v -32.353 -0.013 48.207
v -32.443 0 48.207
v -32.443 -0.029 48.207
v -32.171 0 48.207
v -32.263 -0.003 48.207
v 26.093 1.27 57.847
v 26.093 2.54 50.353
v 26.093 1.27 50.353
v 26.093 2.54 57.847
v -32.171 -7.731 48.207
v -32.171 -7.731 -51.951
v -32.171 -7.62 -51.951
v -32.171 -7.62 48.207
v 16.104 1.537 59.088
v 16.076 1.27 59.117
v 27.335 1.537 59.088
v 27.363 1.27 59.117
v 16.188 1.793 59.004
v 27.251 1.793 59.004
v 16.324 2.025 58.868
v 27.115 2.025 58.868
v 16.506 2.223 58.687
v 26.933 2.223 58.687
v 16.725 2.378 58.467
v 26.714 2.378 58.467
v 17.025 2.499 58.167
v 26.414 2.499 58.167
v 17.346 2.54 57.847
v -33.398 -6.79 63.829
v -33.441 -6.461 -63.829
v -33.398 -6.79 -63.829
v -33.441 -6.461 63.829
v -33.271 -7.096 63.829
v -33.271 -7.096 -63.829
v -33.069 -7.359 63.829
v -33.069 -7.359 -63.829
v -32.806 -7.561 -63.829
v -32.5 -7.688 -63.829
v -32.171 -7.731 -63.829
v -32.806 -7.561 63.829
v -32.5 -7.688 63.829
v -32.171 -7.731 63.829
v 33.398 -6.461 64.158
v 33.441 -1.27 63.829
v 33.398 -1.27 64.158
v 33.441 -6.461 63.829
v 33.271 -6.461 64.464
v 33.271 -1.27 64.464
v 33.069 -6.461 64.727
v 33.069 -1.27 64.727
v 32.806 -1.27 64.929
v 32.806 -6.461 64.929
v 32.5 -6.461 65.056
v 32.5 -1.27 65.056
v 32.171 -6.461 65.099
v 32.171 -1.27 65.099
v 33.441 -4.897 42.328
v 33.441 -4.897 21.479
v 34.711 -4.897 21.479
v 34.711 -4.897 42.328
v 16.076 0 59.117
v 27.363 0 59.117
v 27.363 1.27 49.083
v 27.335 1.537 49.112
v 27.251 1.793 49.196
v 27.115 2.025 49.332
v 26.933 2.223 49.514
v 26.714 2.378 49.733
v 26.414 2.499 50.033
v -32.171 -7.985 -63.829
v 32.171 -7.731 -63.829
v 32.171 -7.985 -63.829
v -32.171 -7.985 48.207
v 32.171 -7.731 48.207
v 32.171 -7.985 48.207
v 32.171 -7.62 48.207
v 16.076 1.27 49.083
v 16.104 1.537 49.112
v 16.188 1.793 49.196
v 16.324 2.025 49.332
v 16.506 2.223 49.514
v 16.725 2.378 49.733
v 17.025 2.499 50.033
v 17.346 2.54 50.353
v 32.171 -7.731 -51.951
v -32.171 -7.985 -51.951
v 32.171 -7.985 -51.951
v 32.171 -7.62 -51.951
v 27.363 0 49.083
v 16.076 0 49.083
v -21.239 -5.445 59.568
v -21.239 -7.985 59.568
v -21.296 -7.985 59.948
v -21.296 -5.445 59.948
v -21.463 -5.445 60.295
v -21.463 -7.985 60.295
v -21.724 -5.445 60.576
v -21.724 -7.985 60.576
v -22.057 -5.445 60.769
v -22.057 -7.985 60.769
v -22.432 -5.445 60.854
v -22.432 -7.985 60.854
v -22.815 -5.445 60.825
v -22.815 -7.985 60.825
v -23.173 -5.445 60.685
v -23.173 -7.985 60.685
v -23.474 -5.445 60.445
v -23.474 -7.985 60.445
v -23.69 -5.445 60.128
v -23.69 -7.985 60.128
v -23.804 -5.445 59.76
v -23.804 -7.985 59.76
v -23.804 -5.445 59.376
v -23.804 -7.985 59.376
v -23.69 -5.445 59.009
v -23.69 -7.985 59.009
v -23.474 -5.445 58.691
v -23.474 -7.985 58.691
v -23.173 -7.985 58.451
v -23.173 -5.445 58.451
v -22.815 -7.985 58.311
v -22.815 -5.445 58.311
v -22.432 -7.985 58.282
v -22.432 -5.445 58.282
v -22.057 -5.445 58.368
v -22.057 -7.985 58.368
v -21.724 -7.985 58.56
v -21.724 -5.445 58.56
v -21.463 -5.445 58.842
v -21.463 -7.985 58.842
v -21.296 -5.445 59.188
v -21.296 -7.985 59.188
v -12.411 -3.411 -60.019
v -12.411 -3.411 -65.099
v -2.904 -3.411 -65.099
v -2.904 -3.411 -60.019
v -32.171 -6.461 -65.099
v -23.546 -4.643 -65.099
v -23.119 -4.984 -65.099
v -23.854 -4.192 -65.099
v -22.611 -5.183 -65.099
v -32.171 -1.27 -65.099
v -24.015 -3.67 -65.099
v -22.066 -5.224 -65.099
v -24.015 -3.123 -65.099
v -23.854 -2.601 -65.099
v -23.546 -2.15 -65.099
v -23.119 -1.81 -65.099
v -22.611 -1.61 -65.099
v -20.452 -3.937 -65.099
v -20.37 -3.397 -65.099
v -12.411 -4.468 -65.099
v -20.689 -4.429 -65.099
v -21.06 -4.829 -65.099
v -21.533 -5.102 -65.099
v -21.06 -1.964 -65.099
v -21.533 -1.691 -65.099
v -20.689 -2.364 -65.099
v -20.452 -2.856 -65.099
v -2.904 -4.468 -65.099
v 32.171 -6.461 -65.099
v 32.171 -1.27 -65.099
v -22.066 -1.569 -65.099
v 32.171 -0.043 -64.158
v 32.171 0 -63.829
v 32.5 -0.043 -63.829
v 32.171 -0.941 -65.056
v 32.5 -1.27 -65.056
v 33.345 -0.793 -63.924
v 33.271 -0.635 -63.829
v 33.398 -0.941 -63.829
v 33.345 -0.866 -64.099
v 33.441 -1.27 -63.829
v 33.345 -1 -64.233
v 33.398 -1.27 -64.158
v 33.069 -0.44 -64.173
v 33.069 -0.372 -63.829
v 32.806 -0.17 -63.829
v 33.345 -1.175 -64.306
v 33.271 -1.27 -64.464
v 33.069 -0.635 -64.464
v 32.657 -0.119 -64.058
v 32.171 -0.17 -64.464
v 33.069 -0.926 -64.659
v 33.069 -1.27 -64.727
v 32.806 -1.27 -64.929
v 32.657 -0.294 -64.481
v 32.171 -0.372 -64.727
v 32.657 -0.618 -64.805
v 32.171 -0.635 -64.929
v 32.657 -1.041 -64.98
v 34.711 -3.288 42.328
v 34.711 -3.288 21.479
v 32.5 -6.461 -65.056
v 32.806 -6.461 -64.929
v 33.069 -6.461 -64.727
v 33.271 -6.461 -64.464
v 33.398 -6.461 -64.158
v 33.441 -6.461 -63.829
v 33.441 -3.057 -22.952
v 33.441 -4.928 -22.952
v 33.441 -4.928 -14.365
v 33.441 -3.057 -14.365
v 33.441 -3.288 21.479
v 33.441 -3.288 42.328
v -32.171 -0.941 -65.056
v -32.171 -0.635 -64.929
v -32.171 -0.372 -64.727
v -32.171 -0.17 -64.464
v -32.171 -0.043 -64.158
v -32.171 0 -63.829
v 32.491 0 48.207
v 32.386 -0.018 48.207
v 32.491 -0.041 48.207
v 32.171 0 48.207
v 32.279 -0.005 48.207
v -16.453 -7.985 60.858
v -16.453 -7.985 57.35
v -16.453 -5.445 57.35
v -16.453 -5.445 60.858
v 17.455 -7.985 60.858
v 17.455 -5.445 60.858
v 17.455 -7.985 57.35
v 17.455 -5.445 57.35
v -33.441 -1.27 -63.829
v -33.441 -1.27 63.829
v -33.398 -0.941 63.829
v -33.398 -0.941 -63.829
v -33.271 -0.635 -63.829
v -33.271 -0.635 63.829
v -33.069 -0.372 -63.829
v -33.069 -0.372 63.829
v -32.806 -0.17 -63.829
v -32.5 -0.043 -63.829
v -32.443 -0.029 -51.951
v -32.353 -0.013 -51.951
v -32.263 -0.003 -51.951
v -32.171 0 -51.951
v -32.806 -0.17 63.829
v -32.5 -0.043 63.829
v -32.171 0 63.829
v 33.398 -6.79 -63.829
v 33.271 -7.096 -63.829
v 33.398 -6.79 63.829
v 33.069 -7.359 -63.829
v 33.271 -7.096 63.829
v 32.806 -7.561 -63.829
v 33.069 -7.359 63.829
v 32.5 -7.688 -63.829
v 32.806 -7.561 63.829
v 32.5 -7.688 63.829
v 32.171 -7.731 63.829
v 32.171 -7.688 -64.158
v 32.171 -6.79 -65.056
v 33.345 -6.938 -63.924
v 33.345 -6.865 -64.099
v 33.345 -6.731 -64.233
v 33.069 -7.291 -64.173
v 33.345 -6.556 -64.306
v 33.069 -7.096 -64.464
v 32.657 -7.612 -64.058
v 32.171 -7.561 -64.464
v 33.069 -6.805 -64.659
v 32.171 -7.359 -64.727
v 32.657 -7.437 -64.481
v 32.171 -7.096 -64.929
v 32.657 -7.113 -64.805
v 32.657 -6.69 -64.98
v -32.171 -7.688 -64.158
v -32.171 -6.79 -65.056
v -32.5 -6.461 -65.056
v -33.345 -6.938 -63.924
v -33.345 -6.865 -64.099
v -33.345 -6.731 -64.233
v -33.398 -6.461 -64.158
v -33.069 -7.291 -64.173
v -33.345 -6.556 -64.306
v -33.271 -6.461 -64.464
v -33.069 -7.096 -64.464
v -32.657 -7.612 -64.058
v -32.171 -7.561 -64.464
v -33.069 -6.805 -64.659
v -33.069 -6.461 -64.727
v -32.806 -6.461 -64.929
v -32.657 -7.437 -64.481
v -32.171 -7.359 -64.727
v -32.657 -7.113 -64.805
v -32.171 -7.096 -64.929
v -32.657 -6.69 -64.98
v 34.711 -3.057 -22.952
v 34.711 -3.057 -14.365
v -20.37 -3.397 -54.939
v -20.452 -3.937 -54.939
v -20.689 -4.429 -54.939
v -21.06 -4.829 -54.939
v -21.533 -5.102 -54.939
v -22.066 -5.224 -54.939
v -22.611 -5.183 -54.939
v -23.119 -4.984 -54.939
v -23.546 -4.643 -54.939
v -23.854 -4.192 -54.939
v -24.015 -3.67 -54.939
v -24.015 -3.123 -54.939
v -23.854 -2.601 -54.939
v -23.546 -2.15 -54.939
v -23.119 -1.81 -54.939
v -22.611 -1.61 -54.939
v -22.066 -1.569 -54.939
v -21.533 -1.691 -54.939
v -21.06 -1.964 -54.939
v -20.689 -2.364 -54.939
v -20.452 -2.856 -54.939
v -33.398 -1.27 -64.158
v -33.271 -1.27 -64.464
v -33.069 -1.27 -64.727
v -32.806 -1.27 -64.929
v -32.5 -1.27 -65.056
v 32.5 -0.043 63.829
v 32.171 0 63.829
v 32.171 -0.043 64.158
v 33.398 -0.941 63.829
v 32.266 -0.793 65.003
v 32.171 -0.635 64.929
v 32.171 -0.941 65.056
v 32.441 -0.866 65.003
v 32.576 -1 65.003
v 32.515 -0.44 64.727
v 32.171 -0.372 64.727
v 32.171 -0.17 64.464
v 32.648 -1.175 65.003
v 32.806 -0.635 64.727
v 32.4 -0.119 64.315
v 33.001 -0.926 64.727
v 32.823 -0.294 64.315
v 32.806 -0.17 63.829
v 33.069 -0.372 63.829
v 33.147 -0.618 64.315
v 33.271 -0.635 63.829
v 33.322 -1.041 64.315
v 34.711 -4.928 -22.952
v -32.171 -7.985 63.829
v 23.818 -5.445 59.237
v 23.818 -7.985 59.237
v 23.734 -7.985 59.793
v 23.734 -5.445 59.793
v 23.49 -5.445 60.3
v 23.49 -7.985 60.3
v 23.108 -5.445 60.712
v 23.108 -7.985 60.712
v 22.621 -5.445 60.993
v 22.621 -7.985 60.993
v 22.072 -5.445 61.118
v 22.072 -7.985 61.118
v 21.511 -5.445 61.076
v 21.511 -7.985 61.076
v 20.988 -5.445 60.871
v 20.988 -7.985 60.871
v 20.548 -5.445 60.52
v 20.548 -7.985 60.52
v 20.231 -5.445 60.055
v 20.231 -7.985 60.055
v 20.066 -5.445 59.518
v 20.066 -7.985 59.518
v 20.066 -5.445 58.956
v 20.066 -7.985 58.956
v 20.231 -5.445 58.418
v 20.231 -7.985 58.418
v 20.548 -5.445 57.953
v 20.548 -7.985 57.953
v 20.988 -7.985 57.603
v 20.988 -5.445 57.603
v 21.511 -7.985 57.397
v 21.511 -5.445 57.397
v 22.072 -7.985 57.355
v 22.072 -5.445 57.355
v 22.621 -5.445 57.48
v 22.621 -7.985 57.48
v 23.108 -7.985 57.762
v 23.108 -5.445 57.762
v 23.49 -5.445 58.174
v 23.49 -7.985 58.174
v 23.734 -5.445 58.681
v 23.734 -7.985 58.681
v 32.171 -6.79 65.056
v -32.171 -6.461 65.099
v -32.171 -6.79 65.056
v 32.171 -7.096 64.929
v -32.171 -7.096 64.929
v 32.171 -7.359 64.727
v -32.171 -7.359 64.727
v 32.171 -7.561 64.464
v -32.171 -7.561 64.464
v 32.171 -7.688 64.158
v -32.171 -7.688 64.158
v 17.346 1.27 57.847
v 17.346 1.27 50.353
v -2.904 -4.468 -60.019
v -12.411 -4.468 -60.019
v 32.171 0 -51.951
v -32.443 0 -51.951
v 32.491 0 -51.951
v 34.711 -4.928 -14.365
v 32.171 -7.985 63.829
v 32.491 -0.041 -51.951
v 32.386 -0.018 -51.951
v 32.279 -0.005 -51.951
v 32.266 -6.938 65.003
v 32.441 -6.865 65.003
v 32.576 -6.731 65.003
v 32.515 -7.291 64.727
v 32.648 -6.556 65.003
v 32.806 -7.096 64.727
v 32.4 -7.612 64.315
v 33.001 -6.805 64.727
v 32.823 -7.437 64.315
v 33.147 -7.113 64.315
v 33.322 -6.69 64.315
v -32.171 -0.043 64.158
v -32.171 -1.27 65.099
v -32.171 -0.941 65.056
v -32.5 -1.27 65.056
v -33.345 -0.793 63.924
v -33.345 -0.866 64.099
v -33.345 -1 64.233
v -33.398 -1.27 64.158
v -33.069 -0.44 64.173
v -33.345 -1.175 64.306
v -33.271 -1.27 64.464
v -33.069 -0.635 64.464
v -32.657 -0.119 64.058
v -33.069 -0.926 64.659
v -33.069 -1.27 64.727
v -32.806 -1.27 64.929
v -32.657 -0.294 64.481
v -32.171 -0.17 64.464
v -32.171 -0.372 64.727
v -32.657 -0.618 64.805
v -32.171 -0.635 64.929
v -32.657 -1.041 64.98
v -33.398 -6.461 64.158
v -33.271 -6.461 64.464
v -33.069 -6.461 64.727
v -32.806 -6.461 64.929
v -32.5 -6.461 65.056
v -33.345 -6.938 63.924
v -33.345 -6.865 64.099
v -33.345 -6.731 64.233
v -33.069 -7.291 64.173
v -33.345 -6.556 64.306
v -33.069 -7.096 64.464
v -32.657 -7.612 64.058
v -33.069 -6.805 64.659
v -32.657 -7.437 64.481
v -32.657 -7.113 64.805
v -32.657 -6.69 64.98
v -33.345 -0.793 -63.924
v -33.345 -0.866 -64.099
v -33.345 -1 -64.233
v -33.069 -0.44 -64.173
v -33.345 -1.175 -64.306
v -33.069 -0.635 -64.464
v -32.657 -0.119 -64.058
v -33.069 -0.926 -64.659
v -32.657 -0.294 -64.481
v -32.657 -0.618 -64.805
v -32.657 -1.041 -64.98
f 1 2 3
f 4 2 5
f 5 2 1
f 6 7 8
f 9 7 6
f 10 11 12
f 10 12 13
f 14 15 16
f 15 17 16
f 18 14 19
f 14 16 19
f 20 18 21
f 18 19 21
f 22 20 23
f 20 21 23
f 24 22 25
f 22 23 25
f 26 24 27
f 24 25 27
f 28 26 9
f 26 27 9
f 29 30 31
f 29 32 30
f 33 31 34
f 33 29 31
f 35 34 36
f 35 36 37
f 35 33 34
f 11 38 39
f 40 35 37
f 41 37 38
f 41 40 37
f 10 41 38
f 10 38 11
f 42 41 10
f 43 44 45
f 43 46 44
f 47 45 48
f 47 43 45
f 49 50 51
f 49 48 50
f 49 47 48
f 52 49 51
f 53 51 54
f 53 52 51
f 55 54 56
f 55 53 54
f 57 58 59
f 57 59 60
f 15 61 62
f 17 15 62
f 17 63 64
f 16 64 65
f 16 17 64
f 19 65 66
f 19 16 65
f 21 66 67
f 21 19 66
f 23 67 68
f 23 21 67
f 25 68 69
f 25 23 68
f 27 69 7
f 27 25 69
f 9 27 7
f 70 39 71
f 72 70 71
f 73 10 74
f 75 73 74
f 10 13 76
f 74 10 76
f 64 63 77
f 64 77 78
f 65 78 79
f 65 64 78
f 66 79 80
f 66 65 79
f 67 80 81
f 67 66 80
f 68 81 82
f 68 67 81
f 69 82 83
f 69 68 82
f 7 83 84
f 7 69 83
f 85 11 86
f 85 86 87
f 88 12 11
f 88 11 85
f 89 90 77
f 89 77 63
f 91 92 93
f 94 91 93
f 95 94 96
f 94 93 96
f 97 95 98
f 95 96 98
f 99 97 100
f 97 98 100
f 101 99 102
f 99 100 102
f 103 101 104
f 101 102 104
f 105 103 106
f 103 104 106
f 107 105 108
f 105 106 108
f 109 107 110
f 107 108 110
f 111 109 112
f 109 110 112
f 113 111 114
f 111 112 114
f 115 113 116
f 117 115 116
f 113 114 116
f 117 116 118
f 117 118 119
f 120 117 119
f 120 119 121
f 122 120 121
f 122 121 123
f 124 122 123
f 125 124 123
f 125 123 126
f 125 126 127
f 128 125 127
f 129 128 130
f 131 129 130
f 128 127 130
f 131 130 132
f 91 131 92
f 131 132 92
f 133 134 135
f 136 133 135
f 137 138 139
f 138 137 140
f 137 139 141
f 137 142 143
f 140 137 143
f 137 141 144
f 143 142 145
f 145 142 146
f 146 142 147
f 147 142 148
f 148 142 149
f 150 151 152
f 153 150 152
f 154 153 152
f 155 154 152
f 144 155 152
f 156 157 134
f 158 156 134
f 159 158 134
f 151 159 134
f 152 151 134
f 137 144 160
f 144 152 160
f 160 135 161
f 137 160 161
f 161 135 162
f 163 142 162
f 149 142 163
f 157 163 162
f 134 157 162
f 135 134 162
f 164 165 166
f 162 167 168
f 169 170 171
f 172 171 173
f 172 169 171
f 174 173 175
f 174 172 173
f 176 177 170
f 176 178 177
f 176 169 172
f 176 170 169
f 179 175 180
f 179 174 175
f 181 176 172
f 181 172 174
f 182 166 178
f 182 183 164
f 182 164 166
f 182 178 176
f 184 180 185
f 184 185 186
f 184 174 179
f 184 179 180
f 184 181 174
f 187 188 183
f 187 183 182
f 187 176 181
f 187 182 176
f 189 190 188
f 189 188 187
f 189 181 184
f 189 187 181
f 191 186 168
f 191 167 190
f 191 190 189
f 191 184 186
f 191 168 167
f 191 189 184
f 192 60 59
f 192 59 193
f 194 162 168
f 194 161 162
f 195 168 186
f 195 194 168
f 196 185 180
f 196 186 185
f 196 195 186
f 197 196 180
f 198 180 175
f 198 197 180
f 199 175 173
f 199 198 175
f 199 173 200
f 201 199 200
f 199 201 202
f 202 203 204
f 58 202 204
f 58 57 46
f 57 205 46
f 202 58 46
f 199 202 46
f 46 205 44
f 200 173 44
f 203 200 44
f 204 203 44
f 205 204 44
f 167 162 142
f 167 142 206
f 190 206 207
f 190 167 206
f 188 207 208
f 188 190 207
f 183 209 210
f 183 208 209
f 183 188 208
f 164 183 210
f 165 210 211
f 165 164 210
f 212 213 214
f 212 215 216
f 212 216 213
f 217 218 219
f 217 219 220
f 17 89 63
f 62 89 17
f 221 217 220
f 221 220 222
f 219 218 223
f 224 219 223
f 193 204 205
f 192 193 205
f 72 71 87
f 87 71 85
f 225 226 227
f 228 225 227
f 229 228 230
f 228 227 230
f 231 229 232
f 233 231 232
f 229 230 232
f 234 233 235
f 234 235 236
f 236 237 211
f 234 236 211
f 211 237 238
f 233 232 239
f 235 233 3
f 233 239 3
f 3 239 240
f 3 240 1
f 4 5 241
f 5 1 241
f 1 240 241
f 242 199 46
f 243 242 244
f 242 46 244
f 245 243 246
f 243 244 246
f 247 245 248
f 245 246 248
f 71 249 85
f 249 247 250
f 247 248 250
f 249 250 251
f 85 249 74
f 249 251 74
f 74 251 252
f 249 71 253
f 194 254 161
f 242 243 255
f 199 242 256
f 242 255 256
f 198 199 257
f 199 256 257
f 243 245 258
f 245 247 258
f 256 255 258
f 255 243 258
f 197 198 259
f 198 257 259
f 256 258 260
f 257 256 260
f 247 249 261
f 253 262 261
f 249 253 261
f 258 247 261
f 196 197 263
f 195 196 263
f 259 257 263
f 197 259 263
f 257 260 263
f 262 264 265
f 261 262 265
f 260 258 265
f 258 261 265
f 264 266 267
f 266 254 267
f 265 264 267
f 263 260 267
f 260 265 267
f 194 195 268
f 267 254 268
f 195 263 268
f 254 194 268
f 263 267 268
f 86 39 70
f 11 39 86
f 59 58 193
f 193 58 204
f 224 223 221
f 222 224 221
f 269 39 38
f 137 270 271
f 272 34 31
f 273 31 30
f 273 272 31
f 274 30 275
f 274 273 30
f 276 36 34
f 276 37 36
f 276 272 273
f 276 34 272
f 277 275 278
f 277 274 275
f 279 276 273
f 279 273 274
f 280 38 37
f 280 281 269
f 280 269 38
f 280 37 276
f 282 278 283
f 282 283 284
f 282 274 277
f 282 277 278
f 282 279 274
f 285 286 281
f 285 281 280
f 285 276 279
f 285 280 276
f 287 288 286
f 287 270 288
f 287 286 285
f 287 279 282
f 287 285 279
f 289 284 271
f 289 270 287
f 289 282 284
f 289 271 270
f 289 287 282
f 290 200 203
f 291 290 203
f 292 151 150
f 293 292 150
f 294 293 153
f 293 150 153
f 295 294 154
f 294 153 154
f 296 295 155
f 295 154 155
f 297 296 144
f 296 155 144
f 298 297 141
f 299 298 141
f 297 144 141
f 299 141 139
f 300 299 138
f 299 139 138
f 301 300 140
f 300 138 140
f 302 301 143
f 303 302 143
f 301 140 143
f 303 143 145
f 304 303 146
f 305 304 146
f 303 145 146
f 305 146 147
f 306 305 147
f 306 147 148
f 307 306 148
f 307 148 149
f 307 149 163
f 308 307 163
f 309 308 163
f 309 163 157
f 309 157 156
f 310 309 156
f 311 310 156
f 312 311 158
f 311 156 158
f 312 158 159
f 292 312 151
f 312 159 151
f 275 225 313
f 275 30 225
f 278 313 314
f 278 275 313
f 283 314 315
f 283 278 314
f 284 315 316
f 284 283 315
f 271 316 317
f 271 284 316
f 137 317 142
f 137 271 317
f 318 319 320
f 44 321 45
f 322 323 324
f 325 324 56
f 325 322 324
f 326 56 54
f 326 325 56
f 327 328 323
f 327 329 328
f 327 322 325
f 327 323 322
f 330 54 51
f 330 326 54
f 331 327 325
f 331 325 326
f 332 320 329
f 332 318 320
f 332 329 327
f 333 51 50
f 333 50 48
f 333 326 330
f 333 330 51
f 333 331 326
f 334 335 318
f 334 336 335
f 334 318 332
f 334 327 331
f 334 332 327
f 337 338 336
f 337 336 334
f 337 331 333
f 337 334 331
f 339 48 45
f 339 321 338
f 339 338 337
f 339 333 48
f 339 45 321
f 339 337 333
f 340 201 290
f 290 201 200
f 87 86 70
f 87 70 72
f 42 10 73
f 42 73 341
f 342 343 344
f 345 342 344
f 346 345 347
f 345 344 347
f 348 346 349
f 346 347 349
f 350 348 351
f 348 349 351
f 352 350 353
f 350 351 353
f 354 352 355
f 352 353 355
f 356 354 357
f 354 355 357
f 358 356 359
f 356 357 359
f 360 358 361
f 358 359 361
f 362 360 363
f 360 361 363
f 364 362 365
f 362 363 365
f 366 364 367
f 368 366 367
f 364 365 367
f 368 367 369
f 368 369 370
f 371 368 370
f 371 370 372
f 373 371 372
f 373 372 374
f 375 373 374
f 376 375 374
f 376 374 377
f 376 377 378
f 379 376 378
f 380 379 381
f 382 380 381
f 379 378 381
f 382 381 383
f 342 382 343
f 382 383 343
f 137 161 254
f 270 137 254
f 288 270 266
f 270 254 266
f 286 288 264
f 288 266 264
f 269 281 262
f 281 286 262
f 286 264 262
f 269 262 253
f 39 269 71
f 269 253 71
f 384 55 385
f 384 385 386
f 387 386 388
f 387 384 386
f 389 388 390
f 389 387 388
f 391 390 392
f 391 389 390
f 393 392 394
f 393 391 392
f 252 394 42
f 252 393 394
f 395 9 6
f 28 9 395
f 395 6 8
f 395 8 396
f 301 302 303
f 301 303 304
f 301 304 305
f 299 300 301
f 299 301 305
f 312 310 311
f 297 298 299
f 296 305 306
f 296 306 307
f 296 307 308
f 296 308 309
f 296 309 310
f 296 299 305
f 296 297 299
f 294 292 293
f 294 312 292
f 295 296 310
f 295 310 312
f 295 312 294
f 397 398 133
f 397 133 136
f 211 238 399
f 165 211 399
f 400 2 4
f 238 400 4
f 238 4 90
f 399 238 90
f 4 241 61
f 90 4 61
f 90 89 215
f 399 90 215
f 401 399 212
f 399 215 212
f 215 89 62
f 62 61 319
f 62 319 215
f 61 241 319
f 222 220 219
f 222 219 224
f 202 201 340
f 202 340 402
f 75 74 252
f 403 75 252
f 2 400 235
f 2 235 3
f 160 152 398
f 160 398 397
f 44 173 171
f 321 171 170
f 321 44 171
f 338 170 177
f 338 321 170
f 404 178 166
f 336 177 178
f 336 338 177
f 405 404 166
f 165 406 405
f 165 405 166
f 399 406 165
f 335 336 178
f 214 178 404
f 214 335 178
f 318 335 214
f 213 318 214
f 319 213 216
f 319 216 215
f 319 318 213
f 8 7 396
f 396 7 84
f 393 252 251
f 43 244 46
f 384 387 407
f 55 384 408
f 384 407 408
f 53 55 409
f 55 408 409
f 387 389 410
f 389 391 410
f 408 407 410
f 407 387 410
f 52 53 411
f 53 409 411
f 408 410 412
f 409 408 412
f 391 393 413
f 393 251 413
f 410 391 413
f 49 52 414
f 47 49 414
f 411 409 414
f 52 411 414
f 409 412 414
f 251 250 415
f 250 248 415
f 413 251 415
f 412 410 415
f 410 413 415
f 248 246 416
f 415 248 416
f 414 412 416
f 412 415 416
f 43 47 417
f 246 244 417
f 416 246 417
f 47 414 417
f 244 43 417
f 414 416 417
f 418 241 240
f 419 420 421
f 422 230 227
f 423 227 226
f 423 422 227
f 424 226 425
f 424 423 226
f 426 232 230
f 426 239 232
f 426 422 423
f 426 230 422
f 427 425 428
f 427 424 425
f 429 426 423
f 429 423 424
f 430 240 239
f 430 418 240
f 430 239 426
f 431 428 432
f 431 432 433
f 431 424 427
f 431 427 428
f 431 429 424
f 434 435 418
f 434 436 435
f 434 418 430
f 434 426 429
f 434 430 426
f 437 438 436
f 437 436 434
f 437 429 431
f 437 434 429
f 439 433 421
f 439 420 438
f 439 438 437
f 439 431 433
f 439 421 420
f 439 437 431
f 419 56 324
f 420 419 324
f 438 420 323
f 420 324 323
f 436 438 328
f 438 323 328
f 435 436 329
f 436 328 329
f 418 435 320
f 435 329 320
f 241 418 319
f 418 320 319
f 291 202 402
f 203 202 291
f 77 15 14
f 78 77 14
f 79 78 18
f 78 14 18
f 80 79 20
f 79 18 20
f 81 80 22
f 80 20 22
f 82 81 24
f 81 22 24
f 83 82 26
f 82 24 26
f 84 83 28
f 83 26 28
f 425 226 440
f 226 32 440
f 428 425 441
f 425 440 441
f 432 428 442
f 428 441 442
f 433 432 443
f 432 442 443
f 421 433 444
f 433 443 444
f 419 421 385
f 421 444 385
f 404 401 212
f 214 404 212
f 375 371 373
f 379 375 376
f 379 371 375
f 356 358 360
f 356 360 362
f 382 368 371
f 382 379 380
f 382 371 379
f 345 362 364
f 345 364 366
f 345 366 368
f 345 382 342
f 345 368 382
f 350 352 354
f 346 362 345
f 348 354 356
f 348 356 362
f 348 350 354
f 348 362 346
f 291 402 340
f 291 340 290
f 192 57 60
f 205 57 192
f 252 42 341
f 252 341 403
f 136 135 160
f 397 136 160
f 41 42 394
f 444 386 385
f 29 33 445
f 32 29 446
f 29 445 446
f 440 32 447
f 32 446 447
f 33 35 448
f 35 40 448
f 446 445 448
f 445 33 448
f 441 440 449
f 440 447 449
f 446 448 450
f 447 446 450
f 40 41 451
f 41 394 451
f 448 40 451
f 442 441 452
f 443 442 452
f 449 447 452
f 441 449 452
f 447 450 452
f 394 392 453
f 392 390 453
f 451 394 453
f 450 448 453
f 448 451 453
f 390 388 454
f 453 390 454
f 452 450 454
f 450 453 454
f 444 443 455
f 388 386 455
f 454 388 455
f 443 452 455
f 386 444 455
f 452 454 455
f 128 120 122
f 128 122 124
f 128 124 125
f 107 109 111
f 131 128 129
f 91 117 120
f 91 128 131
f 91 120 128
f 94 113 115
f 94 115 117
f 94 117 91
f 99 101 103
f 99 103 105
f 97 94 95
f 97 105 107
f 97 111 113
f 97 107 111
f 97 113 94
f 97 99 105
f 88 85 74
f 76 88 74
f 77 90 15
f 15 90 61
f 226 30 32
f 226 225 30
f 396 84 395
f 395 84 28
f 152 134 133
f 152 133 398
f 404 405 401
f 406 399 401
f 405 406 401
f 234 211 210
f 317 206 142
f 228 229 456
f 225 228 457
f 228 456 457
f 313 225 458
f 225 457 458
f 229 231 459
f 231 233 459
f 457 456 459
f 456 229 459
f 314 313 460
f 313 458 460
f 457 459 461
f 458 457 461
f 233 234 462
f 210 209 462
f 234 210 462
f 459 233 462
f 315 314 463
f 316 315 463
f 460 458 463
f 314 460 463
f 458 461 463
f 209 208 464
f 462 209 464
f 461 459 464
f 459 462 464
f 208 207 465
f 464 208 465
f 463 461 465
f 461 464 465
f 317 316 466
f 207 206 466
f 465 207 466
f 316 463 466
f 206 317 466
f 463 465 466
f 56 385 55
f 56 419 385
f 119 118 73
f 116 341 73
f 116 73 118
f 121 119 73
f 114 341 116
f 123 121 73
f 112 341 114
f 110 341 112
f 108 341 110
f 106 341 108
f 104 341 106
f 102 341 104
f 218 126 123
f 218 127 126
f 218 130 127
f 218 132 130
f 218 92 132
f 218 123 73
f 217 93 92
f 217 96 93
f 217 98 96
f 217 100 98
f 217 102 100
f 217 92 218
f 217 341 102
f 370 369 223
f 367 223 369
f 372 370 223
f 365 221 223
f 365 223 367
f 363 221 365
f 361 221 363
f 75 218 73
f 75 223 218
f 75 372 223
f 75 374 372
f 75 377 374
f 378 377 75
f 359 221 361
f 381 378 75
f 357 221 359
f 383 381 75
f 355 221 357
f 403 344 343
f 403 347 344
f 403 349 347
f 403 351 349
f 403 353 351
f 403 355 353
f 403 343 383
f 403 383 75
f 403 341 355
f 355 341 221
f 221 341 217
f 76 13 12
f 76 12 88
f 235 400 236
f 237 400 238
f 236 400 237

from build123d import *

# Parameters (mm, degrees)
F0_W      = 66.8829083443
F0_H      = 130.1987469196
F1_DEPTH  = 7.7312737703
F2_R      = 1.27
F3_W      = 65.0993585587
F3_H      = 100.7702499628
F1_FACE_W = 64.3429083443
F1_FACE_H = 127.6587469196
F4_DEPTH  = 2.286
F5_W      = 64.9341493845
F5_H      = 100.1578532159
F6_DEPTH  = 7.62
F7_W      = 64.3429083443
F7_H      = 15.6222133744
F8_DEPTH  = 2.54
F9_W      = 33.9078493416
F9_H      = 3.507707268
F9_R      = 1.2895427644
F9_R_2    = 1.8868222833
F10_DEPTH = 2.54
F11_DEPTH = 2.54
F12_W     = 64.3429083443
F12_H     = 11.8786803293
F13_DEPTH = 2.54
F14_W     = 11.2873837352
F14_H     = 10.0332312286
F15_DEPTH = 2.54
F16_R     = 1.27
F17_W     = 8.7473837352
F17_H     = 7.4932312286
F18_DEPTH = 1.27
F19_R     = 1.8325750533
F20_DEPTH = 10.16
F21_W     = 9.5073804259
F21_H     = 1.0563768446
F22_DEPTH = 5.08
F23_W     = 1.6090744175
F23_H     = 20.8489261568
F23_W_2   = 1.8709015567
F23_H_2   = 8.5872001946
F24_DEPTH = 1.27


with BuildPart() as f1:
    # F0 (on Front) → F1 (new body)
    with BuildSketch(Plane.XZ):
        Rectangle(F0_W, F0_H)
    extrude(amount=F1_DEPTH)

    # F2
    f2_edges = [f1.edges().sort_by_distance(p)[0] for p in [
        (0, -7.731274, -65.099373),
        (33.441454, -7.731274, 0),
        (0, -7.731274, 65.099373),
        (-33.441454, -7.731274, 0),
        (0, 0, -65.099373),
        (33.441454, 0, 0),
        (0, 0, 65.099373),
        (-33.441454, 0, 0),
        (-33.441454, -3.865637, 65.099373),
        (33.441454, -3.865637, -65.099373),
        (33.441454, -3.865637, 65.099373),
        (-33.441454, -3.865637, -65.099373),
    ]]
    fillet(f2_edges, radius=F2_R)

    # F3 (on Front) + F1_face (on face) → F4 (cut)
    with BuildSketch(Plane.XZ):
        with Locations((0, -7.4506e-06)):
            Rectangle(F3_W, F3_H)
    with BuildSketch(Plane.XZ.offset(7.7312737703)):
        Rectangle(F1_FACE_W, F1_FACE_H)
    extrude(amount=-F4_DEPTH, mode=Mode.SUBTRACT)

    # F5 (on Front) → F6 (join)
    with BuildSketch(Plane.XZ):
        with Locations((0.0237450004, -1.8717665225)):
            Rectangle(F5_W, F5_H)
    extrude(amount=F6_DEPTH)

    # F7 (on face) → F8 (join)
    with BuildSketch(Plane.XZ.offset(5.4452737703)):
        with Locations((0, 56.0182667726)):
            Rectangle(F7_W, F7_H)
    extrude(amount=F8_DEPTH)

    # F9 (on face) → F10 (cut)
    with BuildSketch(Plane.XZ.offset(7.9852737703)):
        with Locations((0.5013104528, 59.1038409621)):
            Rectangle(F9_W, F9_H)
        with Locations((-22.5284751505, 59.5681518316)):
            Circle(F9_R)
        with Locations((21.9313502312, 59.2368096113)):
            Circle(F9_R_2)
    extrude(amount=-F10_DEPTH, mode=Mode.SUBTRACT)

    # F9 (on face) → F11 (cut)
    with BuildSketch(Plane.XZ.offset(7.9852737703)):
        with Locations((0.5013104528, 59.1038409621)):
            Rectangle(F9_W, F9_H)
        with Locations((-22.5284751505, 59.5681518316)):
            Circle(F9_R)
        with Locations((21.9313502312, 59.2368096113)):
            Circle(F9_R_2)
    extrude(amount=-F11_DEPTH, mode=Mode.SUBTRACT)

    # F12 (on face) → F13 (join)
    with BuildSketch(Plane.XZ.offset(5.4452737703)):
        with Locations((0, -57.8900332952)):
            Rectangle(F12_W, F12_H)
    extrude(amount=F13_DEPTH)

    # F14 (on face) → F15 (join)
    with BuildSketch(Plane.XZ):
        with Locations((21.7194668949, 54.1001018137)):
            Rectangle(F14_W, F14_H)
    extrude(amount=-F15_DEPTH)

    # F16
    f16_edges = [f1.edges().sort_by_distance(p)[0] for p in [
        (27.363159, 2.54, 54.100102),
        (21.719467, 2.54, 59.116717),
        (16.075775, 2.54, 54.100102),
        (21.719467, 2.54, 49.083486),
    ]]
    fillet(f16_edges, radius=F16_R)

    # F17 (on face) → F18 (cut)
    with BuildSketch(Plane(origin=(0, 2.54, 0), x_dir=(-1, 0, 0), z_dir=(0, 1, 0))):
        with Locations((-21.7194668949, 54.1001018137)):
            Rectangle(F17_W, F17_H)
    extrude(amount=-F18_DEPTH, mode=Mode.SUBTRACT)

    # F19 (on face) → F20 (cut)
    with BuildSketch(Plane(origin=(0, 0, -65.0993734598), x_dir=(1, 0, 0), z_dir=(0, 0, -1))):
        with Locations((-22.2030133009, 3.3965744078)):
            Circle(F19_R)
    extrude(amount=-F20_DEPTH, mode=Mode.SUBTRACT)

    # F21 (on face) → F22 (cut)
    with BuildSketch(Plane(origin=(0, 0, -65.0993734598), x_dir=(1, 0, 0), z_dir=(0, 0, -1))):
        with Locations((-7.6575875282, 3.9393249899)):
            Rectangle(F21_W, F21_H)
    extrude(amount=-F22_DEPTH, mode=Mode.SUBTRACT)

    # F23 (on face) → F24 (join)
    with BuildSketch(Plane.YZ.offset(33.4414541721)):
        with Locations((-4.0922162589, 31.9034513086)):
            Rectangle(F23_W, F23_H)
        with Locations((-3.992605838, -18.6585467309)):
            Rectangle(F23_W_2, F23_H_2)
    extrude(amount=F24_DEPTH)


solid = f1.part
